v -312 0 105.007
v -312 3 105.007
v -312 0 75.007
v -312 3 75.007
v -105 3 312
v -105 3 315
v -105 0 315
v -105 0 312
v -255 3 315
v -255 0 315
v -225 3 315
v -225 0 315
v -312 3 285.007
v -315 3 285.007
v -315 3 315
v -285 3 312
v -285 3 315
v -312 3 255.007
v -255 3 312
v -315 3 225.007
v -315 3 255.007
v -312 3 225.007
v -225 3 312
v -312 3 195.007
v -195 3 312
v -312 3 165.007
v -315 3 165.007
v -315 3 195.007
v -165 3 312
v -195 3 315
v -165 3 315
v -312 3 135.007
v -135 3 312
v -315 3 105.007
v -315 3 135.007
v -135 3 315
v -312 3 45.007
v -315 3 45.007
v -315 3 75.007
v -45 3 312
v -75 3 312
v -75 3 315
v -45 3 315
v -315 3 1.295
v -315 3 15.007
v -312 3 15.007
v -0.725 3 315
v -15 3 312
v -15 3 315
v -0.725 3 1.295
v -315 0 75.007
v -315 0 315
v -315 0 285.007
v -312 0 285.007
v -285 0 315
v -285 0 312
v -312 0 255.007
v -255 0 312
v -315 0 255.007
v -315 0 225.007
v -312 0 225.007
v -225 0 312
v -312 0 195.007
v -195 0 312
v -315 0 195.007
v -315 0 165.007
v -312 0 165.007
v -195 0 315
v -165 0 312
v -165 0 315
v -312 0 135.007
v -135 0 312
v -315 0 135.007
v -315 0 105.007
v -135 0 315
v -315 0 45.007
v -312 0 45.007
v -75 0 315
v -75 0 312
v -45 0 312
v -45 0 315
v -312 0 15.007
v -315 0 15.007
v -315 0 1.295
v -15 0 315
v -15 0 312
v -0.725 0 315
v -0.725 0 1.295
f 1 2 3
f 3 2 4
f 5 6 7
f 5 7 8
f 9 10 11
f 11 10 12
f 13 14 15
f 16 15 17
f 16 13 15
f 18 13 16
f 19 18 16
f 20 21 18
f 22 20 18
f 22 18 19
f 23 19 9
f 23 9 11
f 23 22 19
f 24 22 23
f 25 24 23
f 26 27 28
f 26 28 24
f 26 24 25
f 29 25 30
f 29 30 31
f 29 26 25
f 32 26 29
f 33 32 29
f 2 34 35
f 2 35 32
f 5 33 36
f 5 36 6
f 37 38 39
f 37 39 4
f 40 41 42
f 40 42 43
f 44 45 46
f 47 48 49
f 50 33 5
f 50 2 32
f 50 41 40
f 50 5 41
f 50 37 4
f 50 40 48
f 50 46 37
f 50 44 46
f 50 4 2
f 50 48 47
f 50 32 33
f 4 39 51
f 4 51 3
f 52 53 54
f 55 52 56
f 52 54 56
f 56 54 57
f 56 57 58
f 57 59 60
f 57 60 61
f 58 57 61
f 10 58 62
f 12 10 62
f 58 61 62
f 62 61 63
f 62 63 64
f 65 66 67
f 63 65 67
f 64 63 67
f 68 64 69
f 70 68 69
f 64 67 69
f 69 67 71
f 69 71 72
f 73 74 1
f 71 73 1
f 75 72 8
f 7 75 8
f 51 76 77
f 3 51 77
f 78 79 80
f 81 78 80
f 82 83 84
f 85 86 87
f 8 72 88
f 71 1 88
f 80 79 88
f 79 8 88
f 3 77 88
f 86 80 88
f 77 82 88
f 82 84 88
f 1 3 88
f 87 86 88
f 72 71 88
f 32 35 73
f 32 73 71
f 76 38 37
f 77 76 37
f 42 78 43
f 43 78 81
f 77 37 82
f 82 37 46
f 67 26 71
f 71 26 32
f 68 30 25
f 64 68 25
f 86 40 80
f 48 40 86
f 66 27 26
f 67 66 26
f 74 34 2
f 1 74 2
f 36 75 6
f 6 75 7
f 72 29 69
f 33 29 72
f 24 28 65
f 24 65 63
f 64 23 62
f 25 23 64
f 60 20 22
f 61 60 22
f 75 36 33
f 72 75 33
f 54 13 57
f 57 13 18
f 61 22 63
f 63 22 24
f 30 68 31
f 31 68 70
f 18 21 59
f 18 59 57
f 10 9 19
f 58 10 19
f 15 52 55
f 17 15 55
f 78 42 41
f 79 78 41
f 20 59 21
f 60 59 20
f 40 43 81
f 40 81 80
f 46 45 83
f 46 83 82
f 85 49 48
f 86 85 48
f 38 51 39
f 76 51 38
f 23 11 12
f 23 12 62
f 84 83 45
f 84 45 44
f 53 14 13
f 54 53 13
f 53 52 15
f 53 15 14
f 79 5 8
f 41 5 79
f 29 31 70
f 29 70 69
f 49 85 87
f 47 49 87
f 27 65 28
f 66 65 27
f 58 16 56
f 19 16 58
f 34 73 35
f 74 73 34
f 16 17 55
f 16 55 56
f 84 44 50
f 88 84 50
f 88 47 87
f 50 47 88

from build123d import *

# Parameters (mm, degrees)
SKETCH1_W               = 630
SKETCH1_H               = 630
BOSS_EXTRUDE1_DEPTH     = 3
SKETCH3_W               = 3
SKETCH3_H               = 30
CUT_EXTRUDE2_DEPTH      = 3
LPATTERN2_COUNT         = 10
LPATTERN2_PITCH         = 60
MIRROR1_COPY_1_SKETCH_W = 3
MIRROR1_COPY_1_SKETCH_H = 30
MIRROR1_COPY_1_DEPTH    = 3
MIRROR1_COPY_2_SKETCH_W = 3
MIRROR1_COPY_2_SKETCH_H = 30
MIRROR1_COPY_2_DEPTH    = 3
MIRROR1_COPY_3_SKETCH_W = 3
MIRROR1_COPY_3_SKETCH_H = 30
MIRROR1_COPY_3_DEPTH    = 3
MIRROR1_COPY_4_SKETCH_W = 3
MIRROR1_COPY_4_SKETCH_H = 30
MIRROR1_COPY_4_DEPTH    = 3
MIRROR1_COPY_5_SKETCH_W = 3
MIRROR1_COPY_5_SKETCH_H = 30
MIRROR1_COPY_5_DEPTH    = 3
MIRROR1_COPY_6_SKETCH_W = 3
MIRROR1_COPY_6_SKETCH_H = 30
MIRROR1_COPY_6_DEPTH    = 3
MIRROR1_COPY_7_SKETCH_W = 3
MIRROR1_COPY_7_SKETCH_H = 30
MIRROR1_COPY_7_DEPTH    = 3
MIRROR1_COPY_8_SKETCH_W = 3
MIRROR1_COPY_8_SKETCH_H = 30
MIRROR1_COPY_8_DEPTH    = 3
MIRROR1_COPY_9_SKETCH_W = 3
MIRROR1_COPY_9_SKETCH_H = 30
MIRROR1_COPY_9_DEPTH    = 3
SKETCH5_W               = 30
SKETCH5_H               = 3
CUT_EXTRUDE3_DEPTH      = 3
LPATTERN3_COUNT         = 10
LPATTERN3_PITCH         = 60
MIRROR2_COPY_1_SKETCH_W = 30
MIRROR2_COPY_1_SKETCH_H = 3
MIRROR2_COPY_1_DEPTH    = 3
MIRROR2_COPY_2_SKETCH_W = 30
MIRROR2_COPY_2_SKETCH_H = 3
MIRROR2_COPY_2_DEPTH    = 3
MIRROR2_COPY_3_SKETCH_W = 30
MIRROR2_COPY_3_SKETCH_H = 3
MIRROR2_COPY_3_DEPTH    = 3
MIRROR2_COPY_4_SKETCH_W = 30
MIRROR2_COPY_4_SKETCH_H = 3
MIRROR2_COPY_4_DEPTH    = 3
MIRROR2_COPY_5_SKETCH_W = 30
MIRROR2_COPY_5_SKETCH_H = 3
MIRROR2_COPY_5_DEPTH    = 3
MIRROR2_COPY_6_SKETCH_W = 30
MIRROR2_COPY_6_SKETCH_H = 3
MIRROR2_COPY_6_DEPTH    = 3
MIRROR2_COPY_7_SKETCH_W = 30
MIRROR2_COPY_7_SKETCH_H = 3
MIRROR2_COPY_7_DEPTH    = 3
MIRROR2_COPY_8_SKETCH_W = 30
MIRROR2_COPY_8_SKETCH_H = 3
MIRROR2_COPY_8_DEPTH    = 3
MIRROR2_COPY_9_SKETCH_W = 30
MIRROR2_COPY_9_SKETCH_H = 3
MIRROR2_COPY_9_DEPTH    = 3


with BuildPart() as part:
    # Sketch1 → Boss-Extrude1 (new body)
    with BuildSketch(Plane(origin=(0, 0, 0), x_dir=(1, 0, 0), z_dir=(0, 1, 0))):
        Rectangle(SKETCH1_W, SKETCH1_H)
    extrude(amount=BOSS_EXTRUDE1_DEPTH)

    # Sketch3 → Cut-Extrude2 (cut)
    with BuildSketch(Plane(origin=(0, 3, 0), x_dir=(1, 0, 0), z_dir=(0, 1, 0))):
        with Locations((-313.5, -270.006843512)):
            Rectangle(SKETCH3_W, SKETCH3_H)
    cut_extrude2 = extrude(amount=-CUT_EXTRUDE2_DEPTH, mode=Mode.SUBTRACT)

    # LPattern2: Cut-Extrude2 ×10
    with Locations(*[(0, 0, -i * LPATTERN2_PITCH) for i in range(1, LPATTERN2_COUNT)]):
        add(cut_extrude2, mode=Mode.SUBTRACT)

    # Mirror1: Cut-Extrude2 across plane
    add(cut_extrude2.mirror(Plane(origin=(-0.725, 0, 0), x_dir=(0, 0, 1), z_dir=(1, 0, 0))), mode=Mode.SUBTRACT)

    # Mirror1 copy 1 sketch → Mirror1 copy 1 (cut)
    with BuildSketch(Plane(origin=(-1.45, 3, -60), x_dir=(-1, 0, 0), z_dir=(0, 1, 0))):
        with Locations((-313.5, 270.006843512)):
            Rectangle(MIRROR1_COPY_1_SKETCH_W, MIRROR1_COPY_1_SKETCH_H)
    extrude(amount=-MIRROR1_COPY_1_DEPTH, mode=Mode.SUBTRACT)

    # Mirror1 copy 2 sketch → Mirror1 copy 2 (cut)
    with BuildSketch(Plane(origin=(-1.45, 3, -120), x_dir=(-1, 0, 0), z_dir=(0, 1, 0))):
        with Locations((-313.5, 270.006843512)):
            Rectangle(MIRROR1_COPY_2_SKETCH_W, MIRROR1_COPY_2_SKETCH_H)
    extrude(amount=-MIRROR1_COPY_2_DEPTH, mode=Mode.SUBTRACT)

    # Mirror1 copy 3 sketch → Mirror1 copy 3 (cut)
    with BuildSketch(Plane(origin=(-1.45, 3, -180), x_dir=(-1, 0, 0), z_dir=(0, 1, 0))):
        with Locations((-313.5, 270.006843512)):
            Rectangle(MIRROR1_COPY_3_SKETCH_W, MIRROR1_COPY_3_SKETCH_H)
    extrude(amount=-MIRROR1_COPY_3_DEPTH, mode=Mode.SUBTRACT)

    # Mirror1 copy 4 sketch → Mirror1 copy 4 (cut)
    with BuildSketch(Plane(origin=(-1.45, 3, -240), x_dir=(-1, 0, 0), z_dir=(0, 1, 0))):
        with Locations((-313.5, 270.006843512)):
            Rectangle(MIRROR1_COPY_4_SKETCH_W, MIRROR1_COPY_4_SKETCH_H)
    extrude(amount=-MIRROR1_COPY_4_DEPTH, mode=Mode.SUBTRACT)

    # Mirror1 copy 5 sketch → Mirror1 copy 5 (cut)
    with BuildSketch(Plane(origin=(-1.45, 3, -300), x_dir=(-1, 0, 0), z_dir=(0, 1, 0))):
        with Locations((-313.5, 270.006843512)):
            Rectangle(MIRROR1_COPY_5_SKETCH_W, MIRROR1_COPY_5_SKETCH_H)
    extrude(amount=-MIRROR1_COPY_5_DEPTH, mode=Mode.SUBTRACT)

    # Mirror1 copy 6 sketch → Mirror1 copy 6 (cut)
    with BuildSketch(Plane(origin=(-1.45, 3, -360), x_dir=(-1, 0, 0), z_dir=(0, 1, 0))):
        with Locations((-313.5, 270.006843512)):
            Rectangle(MIRROR1_COPY_6_SKETCH_W, MIRROR1_COPY_6_SKETCH_H)
    extrude(amount=-MIRROR1_COPY_6_DEPTH, mode=Mode.SUBTRACT)

    # Mirror1 copy 7 sketch → Mirror1 copy 7 (cut)
    with BuildSketch(Plane(origin=(-1.45, 3, -420), x_dir=(-1, 0, 0), z_dir=(0, 1, 0))):
        with Locations((-313.5, 270.006843512)):
            Rectangle(MIRROR1_COPY_7_SKETCH_W, MIRROR1_COPY_7_SKETCH_H)
    extrude(amount=-MIRROR1_COPY_7_DEPTH, mode=Mode.SUBTRACT)

    # Mirror1 copy 8 sketch → Mirror1 copy 8 (cut)
    with BuildSketch(Plane(origin=(-1.45, 3, -480), x_dir=(-1, 0, 0), z_dir=(0, 1, 0))):
        with Locations((-313.5, 270.006843512)):
            Rectangle(MIRROR1_COPY_8_SKETCH_W, MIRROR1_COPY_8_SKETCH_H)
    extrude(amount=-MIRROR1_COPY_8_DEPTH, mode=Mode.SUBTRACT)

    # Mirror1 copy 9 sketch → Mirror1 copy 9 (cut)
    with BuildSketch(Plane(origin=(-1.45, 3, -540), x_dir=(-1, 0, 0), z_dir=(0, 1, 0))):
        with Locations((-313.5, 270.006843512)):
            Rectangle(MIRROR1_COPY_9_SKETCH_W, MIRROR1_COPY_9_SKETCH_H)
    extrude(amount=-MIRROR1_COPY_9_DEPTH, mode=Mode.SUBTRACT)

    # Sketch5 → Cut-Extrude3 (cut)
    with BuildSketch(Plane(origin=(0, 3, 0), x_dir=(1, 0, 0), z_dir=(0, 1, 0))):
        with Locations((-270.000314512, -313.5)):
            Rectangle(SKETCH5_W, SKETCH5_H)
    cut_extrude3 = extrude(amount=-CUT_EXTRUDE3_DEPTH, mode=Mode.SUBTRACT)

    # LPattern3: Cut-Extrude3 ×10
    with Locations(*[(i * LPATTERN3_PITCH, 0, 0) for i in range(1, LPATTERN3_COUNT)]):
        add(cut_extrude3, mode=Mode.SUBTRACT)

    # Mirror2: Cut-Extrude3 across plane
    add(cut_extrude3.mirror(Plane.XY.offset(1.295)), mode=Mode.SUBTRACT)

    # Mirror2 copy 1 sketch → Mirror2 copy 1 (cut)
    with BuildSketch(Plane(origin=(60, 3, 2.59), x_dir=(1, 0, 0), z_dir=(0, 1, 0))):
        with Locations((-270.000314512, 313.5)):
            Rectangle(MIRROR2_COPY_1_SKETCH_W, MIRROR2_COPY_1_SKETCH_H)
    extrude(amount=-MIRROR2_COPY_1_DEPTH, mode=Mode.SUBTRACT)

    # Mirror2 copy 2 sketch → Mirror2 copy 2 (cut)
    with BuildSketch(Plane(origin=(120, 3, 2.59), x_dir=(1, 0, 0), z_dir=(0, 1, 0))):
        with Locations((-270.000314512, 313.5)):
            Rectangle(MIRROR2_COPY_2_SKETCH_W, MIRROR2_COPY_2_SKETCH_H)
    extrude(amount=-MIRROR2_COPY_2_DEPTH, mode=Mode.SUBTRACT)

    # Mirror2 copy 3 sketch → Mirror2 copy 3 (cut)
    with BuildSketch(Plane(origin=(180, 3, 2.59), x_dir=(1, 0, 0), z_dir=(0, 1, 0))):
        with Locations((-270.000314512, 313.5)):
            Rectangle(MIRROR2_COPY_3_SKETCH_W, MIRROR2_COPY_3_SKETCH_H)
    extrude(amount=-MIRROR2_COPY_3_DEPTH, mode=Mode.SUBTRACT)

    # Mirror2 copy 4 sketch → Mirror2 copy 4 (cut)
    with BuildSketch(Plane(origin=(240, 3, 2.59), x_dir=(1, 0, 0), z_dir=(0, 1, 0))):
        with Locations((-270.000314512, 313.5)):
            Rectangle(MIRROR2_COPY_4_SKETCH_W, MIRROR2_COPY_4_SKETCH_H)
    extrude(amount=-MIRROR2_COPY_4_DEPTH, mode=Mode.SUBTRACT)

    # Mirror2 copy 5 sketch → Mirror2 copy 5 (cut)
    with BuildSketch(Plane(origin=(300, 3, 2.59), x_dir=(1, 0, 0), z_dir=(0, 1, 0))):
        with Locations((-270.000314512, 313.5)):
            Rectangle(MIRROR2_COPY_5_SKETCH_W, MIRROR2_COPY_5_SKETCH_H)
    extrude(amount=-MIRROR2_COPY_5_DEPTH, mode=Mode.SUBTRACT)

    # Mirror2 copy 6 sketch → Mirror2 copy 6 (cut)
    with BuildSketch(Plane(origin=(360, 3, 2.59), x_dir=(1, 0, 0), z_dir=(0, 1, 0))):
        with Locations((-270.000314512, 313.5)):
            Rectangle(MIRROR2_COPY_6_SKETCH_W, MIRROR2_COPY_6_SKETCH_H)
    extrude(amount=-MIRROR2_COPY_6_DEPTH, mode=Mode.SUBTRACT)

    # Mirror2 copy 7 sketch → Mirror2 copy 7 (cut)
    with BuildSketch(Plane(origin=(420, 3, 2.59), x_dir=(1, 0, 0), z_dir=(0, 1, 0))):
        with Locations((-270.000314512, 313.5)):
            Rectangle(MIRROR2_COPY_7_SKETCH_W, MIRROR2_COPY_7_SKETCH_H)
    extrude(amount=-MIRROR2_COPY_7_DEPTH, mode=Mode.SUBTRACT)

    # Mirror2 copy 8 sketch → Mirror2 copy 8 (cut)
    with BuildSketch(Plane(origin=(480, 3, 2.59), x_dir=(1, 0, 0), z_dir=(0, 1, 0))):
        with Locations((-270.000314512, 313.5)):
            Rectangle(MIRROR2_COPY_8_SKETCH_W, MIRROR2_COPY_8_SKETCH_H)
    extrude(amount=-MIRROR2_COPY_8_DEPTH, mode=Mode.SUBTRACT)

    # Mirror2 copy 9 sketch → Mirror2 copy 9 (cut)
    with BuildSketch(Plane(origin=(540, 3, 2.59), x_dir=(1, 0, 0), z_dir=(0, 1, 0))):
        with Locations((-270.000314512, 313.5)):
            Rectangle(MIRROR2_COPY_9_SKETCH_W, MIRROR2_COPY_9_SKETCH_H)
    extrude(amount=-MIRROR2_COPY_9_DEPTH, mode=Mode.SUBTRACT)

    # SurfaceCut1
    split(bisect_by=Plane.XY.offset(1.295), keep=Keep.TOP)

    # SurfaceCut2
    split(bisect_by=Plane(origin=(-0.725, 0, 0), x_dir=(0, 0, -1), z_dir=(1, 0, 0)), keep=Keep.BOTTOM)


solid = part.part
